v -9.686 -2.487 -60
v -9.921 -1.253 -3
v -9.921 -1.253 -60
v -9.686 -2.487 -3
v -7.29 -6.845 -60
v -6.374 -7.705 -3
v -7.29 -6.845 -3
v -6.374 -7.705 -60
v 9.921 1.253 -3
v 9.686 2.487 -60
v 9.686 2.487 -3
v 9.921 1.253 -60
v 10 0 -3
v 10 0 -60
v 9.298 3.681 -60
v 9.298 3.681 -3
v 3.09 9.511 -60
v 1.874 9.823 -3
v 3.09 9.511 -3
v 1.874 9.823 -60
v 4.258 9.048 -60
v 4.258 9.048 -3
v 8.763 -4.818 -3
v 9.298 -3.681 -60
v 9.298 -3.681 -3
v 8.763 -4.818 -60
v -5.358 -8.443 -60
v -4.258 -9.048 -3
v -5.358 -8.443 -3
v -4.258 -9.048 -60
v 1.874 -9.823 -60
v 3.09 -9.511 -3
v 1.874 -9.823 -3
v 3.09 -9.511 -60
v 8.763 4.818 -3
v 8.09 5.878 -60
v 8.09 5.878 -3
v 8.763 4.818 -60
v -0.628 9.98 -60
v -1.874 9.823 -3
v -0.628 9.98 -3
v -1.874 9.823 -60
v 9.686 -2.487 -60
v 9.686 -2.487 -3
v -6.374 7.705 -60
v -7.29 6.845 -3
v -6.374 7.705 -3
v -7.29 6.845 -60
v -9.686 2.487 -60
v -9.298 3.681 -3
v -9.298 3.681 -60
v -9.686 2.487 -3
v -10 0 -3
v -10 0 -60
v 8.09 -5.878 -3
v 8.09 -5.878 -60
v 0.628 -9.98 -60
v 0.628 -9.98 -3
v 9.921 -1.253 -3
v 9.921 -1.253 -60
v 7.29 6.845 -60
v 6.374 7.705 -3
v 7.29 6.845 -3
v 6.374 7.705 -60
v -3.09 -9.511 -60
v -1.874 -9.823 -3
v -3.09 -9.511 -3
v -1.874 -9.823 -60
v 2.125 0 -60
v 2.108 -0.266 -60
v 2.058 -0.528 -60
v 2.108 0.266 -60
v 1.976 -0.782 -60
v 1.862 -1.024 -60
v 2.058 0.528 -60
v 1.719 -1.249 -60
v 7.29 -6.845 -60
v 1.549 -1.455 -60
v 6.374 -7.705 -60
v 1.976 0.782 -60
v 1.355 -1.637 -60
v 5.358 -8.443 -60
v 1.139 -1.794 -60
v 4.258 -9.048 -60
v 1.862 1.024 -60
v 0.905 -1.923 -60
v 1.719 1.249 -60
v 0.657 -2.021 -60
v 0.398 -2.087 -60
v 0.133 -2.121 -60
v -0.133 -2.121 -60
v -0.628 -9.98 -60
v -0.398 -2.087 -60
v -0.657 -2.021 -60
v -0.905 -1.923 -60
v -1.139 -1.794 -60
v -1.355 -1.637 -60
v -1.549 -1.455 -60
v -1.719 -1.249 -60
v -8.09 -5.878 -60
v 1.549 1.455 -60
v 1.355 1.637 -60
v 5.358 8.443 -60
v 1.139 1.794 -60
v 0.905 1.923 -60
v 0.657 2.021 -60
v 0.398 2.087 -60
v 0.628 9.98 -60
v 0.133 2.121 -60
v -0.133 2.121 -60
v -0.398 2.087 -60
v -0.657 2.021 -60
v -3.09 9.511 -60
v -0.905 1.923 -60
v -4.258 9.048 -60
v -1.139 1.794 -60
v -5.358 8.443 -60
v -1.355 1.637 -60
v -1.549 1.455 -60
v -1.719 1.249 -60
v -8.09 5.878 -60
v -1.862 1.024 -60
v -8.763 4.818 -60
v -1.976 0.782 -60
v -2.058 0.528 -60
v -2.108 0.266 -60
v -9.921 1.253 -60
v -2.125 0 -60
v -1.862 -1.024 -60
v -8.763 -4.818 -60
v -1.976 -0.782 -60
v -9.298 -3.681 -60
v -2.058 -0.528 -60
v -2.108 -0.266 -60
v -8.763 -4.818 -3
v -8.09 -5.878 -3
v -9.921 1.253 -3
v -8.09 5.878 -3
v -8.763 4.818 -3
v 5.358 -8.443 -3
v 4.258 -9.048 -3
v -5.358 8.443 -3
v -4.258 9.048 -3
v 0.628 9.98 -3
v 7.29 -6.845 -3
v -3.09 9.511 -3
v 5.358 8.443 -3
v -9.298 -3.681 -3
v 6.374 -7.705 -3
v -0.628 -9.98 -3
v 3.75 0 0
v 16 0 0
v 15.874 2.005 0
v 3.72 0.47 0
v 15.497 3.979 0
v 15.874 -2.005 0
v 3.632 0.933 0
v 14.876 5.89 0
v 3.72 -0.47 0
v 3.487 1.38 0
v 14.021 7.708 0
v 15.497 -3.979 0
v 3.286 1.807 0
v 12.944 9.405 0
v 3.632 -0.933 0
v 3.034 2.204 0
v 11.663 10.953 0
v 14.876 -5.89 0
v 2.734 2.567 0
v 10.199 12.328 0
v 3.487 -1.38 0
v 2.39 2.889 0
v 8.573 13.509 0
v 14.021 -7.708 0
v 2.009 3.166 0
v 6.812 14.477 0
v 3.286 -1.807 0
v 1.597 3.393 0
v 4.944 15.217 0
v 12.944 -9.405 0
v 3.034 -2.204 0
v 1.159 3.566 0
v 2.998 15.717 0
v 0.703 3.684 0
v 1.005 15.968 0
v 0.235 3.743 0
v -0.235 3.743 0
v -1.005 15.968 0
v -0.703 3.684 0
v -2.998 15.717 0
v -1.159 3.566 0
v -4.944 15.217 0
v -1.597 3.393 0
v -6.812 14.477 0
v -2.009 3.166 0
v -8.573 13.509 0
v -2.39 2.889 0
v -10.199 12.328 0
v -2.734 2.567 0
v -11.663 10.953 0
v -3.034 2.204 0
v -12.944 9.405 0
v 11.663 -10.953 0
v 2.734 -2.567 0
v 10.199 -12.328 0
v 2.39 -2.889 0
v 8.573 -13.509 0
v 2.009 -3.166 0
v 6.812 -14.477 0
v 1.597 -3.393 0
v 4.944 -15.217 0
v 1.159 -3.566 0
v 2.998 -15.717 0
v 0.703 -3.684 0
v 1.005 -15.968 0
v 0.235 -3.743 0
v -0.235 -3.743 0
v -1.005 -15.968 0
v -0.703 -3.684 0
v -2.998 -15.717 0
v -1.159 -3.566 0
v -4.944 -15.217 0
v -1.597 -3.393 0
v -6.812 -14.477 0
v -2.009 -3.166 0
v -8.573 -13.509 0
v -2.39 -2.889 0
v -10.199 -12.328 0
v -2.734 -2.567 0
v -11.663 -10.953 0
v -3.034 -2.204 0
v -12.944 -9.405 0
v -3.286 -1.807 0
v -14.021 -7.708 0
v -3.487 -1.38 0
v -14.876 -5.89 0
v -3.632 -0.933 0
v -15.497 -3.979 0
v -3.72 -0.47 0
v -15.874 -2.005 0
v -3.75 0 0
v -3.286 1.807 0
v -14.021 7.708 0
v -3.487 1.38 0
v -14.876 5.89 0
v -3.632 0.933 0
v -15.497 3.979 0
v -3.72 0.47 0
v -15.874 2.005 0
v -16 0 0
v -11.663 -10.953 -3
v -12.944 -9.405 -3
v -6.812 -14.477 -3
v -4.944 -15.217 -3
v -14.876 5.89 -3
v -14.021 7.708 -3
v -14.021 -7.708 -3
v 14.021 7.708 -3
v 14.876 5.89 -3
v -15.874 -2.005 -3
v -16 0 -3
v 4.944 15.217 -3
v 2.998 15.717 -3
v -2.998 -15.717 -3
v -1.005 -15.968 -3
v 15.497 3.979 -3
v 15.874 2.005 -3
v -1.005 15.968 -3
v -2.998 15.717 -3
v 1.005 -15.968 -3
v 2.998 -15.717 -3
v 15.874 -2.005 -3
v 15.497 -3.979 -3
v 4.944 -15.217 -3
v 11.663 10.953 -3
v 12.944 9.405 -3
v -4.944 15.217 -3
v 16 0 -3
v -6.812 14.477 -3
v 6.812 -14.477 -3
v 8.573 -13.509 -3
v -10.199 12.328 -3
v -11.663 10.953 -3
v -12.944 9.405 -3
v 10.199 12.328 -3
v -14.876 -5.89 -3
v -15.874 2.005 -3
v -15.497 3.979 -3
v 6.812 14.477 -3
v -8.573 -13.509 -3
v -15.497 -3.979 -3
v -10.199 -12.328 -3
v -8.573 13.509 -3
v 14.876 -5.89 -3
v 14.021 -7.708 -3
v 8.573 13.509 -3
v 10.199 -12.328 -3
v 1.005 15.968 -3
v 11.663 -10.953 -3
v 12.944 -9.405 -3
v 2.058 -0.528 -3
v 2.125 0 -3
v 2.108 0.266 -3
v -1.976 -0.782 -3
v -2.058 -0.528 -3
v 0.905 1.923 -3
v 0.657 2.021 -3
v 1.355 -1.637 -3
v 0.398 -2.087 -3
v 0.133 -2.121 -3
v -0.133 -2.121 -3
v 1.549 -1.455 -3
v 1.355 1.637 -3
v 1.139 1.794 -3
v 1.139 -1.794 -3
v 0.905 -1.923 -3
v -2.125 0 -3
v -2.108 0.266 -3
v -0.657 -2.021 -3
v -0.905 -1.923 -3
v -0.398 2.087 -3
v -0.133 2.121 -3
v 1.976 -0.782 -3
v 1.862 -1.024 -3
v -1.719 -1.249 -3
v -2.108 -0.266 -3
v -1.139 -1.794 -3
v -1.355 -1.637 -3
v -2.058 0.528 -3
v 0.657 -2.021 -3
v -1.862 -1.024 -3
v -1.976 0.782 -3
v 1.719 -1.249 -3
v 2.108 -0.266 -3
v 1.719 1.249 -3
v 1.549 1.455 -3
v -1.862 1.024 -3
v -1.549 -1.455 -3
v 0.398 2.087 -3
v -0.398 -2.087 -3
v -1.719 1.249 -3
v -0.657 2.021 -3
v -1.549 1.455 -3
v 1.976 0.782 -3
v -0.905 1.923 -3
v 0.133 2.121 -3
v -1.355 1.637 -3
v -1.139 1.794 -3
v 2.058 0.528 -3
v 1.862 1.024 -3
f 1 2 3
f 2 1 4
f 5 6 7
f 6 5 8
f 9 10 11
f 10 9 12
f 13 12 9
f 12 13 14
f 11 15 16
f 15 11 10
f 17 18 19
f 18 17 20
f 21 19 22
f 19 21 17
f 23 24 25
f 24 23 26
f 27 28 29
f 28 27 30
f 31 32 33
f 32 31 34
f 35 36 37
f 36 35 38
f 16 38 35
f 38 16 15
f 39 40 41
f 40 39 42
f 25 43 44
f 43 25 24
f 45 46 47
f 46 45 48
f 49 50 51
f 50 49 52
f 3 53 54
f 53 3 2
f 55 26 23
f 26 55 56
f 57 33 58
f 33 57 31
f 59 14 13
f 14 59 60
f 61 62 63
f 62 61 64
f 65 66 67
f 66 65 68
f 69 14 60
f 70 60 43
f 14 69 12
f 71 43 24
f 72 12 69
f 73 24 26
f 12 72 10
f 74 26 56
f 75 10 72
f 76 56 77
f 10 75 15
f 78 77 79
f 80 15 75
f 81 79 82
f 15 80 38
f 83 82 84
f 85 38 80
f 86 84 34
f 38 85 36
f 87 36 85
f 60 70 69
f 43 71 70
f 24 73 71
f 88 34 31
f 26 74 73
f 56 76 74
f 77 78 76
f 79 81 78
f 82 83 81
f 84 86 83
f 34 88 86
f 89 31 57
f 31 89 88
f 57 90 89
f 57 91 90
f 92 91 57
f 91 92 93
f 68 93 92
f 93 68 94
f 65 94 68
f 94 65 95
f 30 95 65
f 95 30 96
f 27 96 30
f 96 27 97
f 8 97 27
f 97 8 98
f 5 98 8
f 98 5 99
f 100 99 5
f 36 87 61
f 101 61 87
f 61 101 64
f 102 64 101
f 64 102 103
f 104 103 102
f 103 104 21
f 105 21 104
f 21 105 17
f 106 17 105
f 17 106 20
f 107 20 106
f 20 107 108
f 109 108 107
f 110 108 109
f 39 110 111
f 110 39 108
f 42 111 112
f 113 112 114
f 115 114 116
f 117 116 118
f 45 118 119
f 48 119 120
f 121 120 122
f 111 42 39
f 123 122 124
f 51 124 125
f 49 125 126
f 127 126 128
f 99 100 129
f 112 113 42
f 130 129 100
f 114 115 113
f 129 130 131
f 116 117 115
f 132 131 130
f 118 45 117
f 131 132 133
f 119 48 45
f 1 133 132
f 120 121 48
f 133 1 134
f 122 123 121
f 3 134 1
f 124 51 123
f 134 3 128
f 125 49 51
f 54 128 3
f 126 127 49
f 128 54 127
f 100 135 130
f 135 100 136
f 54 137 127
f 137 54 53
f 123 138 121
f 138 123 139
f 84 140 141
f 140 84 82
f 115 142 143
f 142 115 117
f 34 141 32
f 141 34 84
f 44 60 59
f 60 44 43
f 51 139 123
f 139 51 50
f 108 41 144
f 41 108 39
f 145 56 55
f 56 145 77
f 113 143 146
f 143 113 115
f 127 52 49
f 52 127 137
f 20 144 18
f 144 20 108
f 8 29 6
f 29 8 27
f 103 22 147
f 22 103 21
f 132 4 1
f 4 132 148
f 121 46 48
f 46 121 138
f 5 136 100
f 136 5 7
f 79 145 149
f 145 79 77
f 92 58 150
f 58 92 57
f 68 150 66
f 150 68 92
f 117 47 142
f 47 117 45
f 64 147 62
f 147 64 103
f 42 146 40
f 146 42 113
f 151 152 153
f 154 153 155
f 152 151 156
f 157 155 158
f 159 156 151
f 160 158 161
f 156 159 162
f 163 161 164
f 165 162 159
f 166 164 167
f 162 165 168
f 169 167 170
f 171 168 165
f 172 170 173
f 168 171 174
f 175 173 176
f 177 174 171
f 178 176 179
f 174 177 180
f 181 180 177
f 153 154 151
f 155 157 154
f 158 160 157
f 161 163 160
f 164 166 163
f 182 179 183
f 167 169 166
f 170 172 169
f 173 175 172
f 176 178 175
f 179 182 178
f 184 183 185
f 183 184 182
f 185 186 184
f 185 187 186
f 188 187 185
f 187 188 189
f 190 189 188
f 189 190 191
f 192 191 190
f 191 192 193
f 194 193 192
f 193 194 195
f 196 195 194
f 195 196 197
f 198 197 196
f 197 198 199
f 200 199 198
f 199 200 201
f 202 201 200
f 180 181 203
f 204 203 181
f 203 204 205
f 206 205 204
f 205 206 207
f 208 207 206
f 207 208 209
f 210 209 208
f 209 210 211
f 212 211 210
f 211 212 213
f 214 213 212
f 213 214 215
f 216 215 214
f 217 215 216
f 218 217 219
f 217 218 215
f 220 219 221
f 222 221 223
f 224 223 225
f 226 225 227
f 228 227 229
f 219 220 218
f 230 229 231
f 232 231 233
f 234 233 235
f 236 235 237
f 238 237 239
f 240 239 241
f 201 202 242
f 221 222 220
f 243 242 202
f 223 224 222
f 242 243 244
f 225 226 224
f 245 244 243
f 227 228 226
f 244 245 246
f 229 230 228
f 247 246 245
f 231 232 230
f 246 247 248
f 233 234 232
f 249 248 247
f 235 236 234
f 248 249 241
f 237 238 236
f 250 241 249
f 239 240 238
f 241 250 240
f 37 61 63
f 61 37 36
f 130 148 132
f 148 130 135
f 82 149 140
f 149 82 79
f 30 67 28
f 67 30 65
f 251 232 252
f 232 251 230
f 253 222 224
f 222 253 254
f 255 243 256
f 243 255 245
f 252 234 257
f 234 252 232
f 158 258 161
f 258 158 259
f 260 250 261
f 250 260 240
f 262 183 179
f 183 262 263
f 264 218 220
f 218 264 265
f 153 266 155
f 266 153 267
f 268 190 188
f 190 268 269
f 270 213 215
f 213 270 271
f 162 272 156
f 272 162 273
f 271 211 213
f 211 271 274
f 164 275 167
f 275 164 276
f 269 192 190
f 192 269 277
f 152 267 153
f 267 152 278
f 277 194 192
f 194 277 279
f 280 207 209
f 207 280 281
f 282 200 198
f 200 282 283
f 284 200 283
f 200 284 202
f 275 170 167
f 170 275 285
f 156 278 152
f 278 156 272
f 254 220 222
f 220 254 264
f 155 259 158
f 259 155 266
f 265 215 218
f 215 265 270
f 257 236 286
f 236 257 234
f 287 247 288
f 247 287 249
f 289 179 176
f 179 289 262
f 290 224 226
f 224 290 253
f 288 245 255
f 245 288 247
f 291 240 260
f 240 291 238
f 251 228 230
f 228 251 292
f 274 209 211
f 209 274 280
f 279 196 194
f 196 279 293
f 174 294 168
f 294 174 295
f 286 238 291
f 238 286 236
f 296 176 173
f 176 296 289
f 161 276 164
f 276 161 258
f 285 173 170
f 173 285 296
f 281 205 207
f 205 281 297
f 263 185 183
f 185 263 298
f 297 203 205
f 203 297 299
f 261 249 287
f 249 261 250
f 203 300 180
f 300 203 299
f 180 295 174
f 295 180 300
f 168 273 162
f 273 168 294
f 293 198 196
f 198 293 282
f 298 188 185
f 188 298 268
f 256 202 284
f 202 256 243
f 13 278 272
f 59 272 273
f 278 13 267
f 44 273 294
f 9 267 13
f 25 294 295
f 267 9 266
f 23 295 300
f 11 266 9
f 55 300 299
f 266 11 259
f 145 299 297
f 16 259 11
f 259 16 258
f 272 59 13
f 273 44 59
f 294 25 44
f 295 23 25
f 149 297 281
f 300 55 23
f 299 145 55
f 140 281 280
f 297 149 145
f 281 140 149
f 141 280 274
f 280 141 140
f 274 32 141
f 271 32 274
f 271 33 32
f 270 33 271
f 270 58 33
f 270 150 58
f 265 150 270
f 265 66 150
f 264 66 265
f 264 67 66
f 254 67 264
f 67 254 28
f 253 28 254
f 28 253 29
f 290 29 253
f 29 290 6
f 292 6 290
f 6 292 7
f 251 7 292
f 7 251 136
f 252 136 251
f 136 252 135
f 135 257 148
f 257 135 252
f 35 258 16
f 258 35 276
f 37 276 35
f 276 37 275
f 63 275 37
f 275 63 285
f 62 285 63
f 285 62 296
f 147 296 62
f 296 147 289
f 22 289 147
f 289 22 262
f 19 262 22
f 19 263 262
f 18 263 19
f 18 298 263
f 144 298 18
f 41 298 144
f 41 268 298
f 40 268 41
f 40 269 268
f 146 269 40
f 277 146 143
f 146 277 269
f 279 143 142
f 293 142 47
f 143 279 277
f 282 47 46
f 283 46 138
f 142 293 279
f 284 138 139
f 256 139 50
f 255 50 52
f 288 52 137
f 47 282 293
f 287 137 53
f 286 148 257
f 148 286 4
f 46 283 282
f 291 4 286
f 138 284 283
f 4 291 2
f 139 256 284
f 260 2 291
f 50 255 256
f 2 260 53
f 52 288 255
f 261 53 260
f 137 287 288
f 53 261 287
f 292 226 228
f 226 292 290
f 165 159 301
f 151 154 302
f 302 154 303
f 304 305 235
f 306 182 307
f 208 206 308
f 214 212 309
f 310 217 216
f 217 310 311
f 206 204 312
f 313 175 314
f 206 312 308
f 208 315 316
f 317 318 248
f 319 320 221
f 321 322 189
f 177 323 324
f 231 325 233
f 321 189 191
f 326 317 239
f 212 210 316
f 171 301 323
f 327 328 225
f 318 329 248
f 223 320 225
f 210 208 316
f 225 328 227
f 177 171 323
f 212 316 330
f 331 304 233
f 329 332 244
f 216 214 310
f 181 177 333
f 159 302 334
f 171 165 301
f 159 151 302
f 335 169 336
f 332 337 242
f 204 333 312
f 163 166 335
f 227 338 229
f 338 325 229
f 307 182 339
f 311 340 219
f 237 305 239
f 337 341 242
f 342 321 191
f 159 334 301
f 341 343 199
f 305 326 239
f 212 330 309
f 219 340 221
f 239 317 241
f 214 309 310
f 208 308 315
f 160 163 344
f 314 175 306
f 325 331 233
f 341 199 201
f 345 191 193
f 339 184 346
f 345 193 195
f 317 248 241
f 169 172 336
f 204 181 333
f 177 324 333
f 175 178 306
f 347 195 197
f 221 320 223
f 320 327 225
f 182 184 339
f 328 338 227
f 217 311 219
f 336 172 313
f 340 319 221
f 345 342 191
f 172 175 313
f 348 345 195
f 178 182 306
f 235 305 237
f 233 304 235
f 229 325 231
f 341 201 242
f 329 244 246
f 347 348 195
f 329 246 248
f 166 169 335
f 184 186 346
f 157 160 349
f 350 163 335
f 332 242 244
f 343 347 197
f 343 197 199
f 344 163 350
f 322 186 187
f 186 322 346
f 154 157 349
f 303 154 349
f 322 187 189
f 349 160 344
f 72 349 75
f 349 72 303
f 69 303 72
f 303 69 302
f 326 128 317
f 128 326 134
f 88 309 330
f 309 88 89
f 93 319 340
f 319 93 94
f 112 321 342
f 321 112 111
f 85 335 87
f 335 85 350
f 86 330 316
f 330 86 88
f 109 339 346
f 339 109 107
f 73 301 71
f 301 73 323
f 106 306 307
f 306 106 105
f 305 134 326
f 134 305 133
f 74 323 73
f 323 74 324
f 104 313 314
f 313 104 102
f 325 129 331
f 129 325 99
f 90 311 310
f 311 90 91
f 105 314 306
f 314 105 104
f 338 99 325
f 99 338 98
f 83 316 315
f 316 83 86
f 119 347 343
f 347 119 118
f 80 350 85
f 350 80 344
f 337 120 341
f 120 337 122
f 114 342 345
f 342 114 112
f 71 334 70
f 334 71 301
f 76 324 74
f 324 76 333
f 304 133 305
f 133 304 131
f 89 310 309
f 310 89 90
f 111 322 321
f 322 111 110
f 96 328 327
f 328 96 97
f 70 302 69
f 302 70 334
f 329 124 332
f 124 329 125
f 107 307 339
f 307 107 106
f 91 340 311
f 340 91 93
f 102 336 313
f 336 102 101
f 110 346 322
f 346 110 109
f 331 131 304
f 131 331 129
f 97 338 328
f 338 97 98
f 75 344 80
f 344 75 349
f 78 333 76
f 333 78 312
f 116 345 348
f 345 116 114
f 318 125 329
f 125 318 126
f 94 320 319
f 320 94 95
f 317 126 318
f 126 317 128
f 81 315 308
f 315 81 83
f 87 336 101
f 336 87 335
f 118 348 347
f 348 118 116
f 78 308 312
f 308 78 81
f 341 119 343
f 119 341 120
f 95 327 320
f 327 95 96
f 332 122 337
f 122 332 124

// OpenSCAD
$fn = 50;


difference() {
	union() {
		translate(v = [0, 0, -60.0000000000]) {
			cylinder(h = 60, r = 10.0000000000);
		}
		translate(v = [0, 0, -3.0000000000]) {
			cylinder(h = 3, r = 16.0000000000);
		}
	}
	union() {
		translate(v = [0, 0, 0]) {
			rotate(a = [0, 0, 0]) {
				difference() {
					union() {
						#translate(v = [0, 0, -60.0000000000]) {
							cylinder(h = 60, r = 2.0000000000);
						}
						#translate(v = [0, 0, -3]) {
							cylinder(h = 3, r1 = 2.1250000000, r2 = 3.7500000000);
						}
						#translate(v = [0, 0, -60.0000000000]) {
							cylinder(h = 60, r = 2.1250000000);
						}
						#translate(v = [0, 0, -60.0000000000]) {
							cylinder(h = 60, r = 2.0000000000);
						}
					}
					union();
				}
			}
		}
	}
}
